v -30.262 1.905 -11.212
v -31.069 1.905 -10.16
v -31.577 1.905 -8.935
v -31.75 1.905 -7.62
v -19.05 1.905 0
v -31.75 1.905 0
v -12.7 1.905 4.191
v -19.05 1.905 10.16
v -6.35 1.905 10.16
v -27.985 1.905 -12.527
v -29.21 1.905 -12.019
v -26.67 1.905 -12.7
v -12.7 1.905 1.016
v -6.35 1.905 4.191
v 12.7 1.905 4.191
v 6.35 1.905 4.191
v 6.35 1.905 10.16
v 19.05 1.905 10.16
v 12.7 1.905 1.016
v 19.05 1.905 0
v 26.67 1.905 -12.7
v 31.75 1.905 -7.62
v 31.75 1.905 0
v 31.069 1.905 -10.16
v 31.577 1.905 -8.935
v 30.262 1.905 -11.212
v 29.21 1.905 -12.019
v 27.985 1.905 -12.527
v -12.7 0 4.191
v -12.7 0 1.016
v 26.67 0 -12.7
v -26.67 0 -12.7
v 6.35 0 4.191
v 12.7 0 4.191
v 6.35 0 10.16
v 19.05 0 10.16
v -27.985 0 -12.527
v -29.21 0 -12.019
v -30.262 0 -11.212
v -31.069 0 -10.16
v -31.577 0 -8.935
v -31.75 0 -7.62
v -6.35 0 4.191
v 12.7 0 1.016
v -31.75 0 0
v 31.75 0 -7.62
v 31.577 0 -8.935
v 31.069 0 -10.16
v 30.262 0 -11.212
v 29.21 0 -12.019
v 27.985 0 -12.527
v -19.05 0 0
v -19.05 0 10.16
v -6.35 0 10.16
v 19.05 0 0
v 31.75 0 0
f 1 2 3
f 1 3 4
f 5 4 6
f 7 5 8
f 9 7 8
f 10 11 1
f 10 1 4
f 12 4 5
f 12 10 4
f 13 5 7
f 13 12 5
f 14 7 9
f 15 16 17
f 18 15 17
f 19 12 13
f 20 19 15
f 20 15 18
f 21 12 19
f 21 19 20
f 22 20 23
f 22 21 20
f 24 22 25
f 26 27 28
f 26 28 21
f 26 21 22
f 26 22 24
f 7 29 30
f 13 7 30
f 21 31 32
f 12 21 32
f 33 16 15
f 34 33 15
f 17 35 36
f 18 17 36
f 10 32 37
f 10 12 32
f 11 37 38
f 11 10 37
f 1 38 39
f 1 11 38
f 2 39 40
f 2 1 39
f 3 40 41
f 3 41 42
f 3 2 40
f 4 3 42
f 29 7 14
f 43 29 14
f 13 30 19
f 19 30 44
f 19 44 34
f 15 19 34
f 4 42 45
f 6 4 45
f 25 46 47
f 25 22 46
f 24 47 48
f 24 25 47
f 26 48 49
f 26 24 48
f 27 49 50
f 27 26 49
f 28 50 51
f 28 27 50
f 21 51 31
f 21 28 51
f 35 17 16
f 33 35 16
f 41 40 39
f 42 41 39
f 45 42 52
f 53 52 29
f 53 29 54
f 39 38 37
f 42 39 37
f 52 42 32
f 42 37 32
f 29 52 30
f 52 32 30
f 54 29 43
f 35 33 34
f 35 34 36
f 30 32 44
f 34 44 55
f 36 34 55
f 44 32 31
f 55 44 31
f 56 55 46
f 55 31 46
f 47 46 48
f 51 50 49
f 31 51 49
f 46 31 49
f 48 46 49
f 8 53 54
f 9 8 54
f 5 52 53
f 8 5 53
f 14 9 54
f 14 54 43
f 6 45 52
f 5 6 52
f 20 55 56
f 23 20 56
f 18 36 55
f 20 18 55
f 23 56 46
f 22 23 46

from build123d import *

# Parameters (mm, degrees)
BOSS_EXTRUDE1_DEPTH = 1.905
FILLET1_R           = 5.08
SKETCH2_W           = 12.7
SKETCH2_H           = 5.969
BOSS_EXTRUDE2_DEPTH = 1.905


with BuildPart() as part:
    # Sketch1 → Boss-Extrude1 (new body)
    with BuildSketch(Plane(origin=(0, 0, 0), x_dir=(1, 0, 0), z_dir=(0, 1, 0))):
        Polygon((19.05, 0), (31.75, 0), (31.75, 12.7), (-31.75, 12.7), (-31.75, 0), (-19.05, 0), (-19.05, -10.16), (-12.7, -10.16), (-12.7, -1.016), (12.7, -1.016), (12.7, -10.16), (19.05, -10.16), align=None)
    extrude(amount=BOSS_EXTRUDE1_DEPTH)

    # Fillet1
    fillet1_edges = [part.edges().sort_by_distance(p)[0] for p in [
        (-31.75, 0.9525, -12.7),
        (31.75, 0.9525, -12.7),
    ]]
    fillet(fillet1_edges, radius=FILLET1_R)

    # Sketch2 → Boss-Extrude2 (add)
    with BuildSketch(Plane(origin=(0, 1.905, 0), x_dir=(1, 0, 0), z_dir=(0, 1, 0))):
        with Locations((-12.7, -7.1755)):
            Rectangle(SKETCH2_W, SKETCH2_H)
        with Locations((12.7, -7.1755)):
            Rectangle(SKETCH2_W, SKETCH2_H)
    extrude(amount=-BOSS_EXTRUDE2_DEPTH)


solid = part.part
